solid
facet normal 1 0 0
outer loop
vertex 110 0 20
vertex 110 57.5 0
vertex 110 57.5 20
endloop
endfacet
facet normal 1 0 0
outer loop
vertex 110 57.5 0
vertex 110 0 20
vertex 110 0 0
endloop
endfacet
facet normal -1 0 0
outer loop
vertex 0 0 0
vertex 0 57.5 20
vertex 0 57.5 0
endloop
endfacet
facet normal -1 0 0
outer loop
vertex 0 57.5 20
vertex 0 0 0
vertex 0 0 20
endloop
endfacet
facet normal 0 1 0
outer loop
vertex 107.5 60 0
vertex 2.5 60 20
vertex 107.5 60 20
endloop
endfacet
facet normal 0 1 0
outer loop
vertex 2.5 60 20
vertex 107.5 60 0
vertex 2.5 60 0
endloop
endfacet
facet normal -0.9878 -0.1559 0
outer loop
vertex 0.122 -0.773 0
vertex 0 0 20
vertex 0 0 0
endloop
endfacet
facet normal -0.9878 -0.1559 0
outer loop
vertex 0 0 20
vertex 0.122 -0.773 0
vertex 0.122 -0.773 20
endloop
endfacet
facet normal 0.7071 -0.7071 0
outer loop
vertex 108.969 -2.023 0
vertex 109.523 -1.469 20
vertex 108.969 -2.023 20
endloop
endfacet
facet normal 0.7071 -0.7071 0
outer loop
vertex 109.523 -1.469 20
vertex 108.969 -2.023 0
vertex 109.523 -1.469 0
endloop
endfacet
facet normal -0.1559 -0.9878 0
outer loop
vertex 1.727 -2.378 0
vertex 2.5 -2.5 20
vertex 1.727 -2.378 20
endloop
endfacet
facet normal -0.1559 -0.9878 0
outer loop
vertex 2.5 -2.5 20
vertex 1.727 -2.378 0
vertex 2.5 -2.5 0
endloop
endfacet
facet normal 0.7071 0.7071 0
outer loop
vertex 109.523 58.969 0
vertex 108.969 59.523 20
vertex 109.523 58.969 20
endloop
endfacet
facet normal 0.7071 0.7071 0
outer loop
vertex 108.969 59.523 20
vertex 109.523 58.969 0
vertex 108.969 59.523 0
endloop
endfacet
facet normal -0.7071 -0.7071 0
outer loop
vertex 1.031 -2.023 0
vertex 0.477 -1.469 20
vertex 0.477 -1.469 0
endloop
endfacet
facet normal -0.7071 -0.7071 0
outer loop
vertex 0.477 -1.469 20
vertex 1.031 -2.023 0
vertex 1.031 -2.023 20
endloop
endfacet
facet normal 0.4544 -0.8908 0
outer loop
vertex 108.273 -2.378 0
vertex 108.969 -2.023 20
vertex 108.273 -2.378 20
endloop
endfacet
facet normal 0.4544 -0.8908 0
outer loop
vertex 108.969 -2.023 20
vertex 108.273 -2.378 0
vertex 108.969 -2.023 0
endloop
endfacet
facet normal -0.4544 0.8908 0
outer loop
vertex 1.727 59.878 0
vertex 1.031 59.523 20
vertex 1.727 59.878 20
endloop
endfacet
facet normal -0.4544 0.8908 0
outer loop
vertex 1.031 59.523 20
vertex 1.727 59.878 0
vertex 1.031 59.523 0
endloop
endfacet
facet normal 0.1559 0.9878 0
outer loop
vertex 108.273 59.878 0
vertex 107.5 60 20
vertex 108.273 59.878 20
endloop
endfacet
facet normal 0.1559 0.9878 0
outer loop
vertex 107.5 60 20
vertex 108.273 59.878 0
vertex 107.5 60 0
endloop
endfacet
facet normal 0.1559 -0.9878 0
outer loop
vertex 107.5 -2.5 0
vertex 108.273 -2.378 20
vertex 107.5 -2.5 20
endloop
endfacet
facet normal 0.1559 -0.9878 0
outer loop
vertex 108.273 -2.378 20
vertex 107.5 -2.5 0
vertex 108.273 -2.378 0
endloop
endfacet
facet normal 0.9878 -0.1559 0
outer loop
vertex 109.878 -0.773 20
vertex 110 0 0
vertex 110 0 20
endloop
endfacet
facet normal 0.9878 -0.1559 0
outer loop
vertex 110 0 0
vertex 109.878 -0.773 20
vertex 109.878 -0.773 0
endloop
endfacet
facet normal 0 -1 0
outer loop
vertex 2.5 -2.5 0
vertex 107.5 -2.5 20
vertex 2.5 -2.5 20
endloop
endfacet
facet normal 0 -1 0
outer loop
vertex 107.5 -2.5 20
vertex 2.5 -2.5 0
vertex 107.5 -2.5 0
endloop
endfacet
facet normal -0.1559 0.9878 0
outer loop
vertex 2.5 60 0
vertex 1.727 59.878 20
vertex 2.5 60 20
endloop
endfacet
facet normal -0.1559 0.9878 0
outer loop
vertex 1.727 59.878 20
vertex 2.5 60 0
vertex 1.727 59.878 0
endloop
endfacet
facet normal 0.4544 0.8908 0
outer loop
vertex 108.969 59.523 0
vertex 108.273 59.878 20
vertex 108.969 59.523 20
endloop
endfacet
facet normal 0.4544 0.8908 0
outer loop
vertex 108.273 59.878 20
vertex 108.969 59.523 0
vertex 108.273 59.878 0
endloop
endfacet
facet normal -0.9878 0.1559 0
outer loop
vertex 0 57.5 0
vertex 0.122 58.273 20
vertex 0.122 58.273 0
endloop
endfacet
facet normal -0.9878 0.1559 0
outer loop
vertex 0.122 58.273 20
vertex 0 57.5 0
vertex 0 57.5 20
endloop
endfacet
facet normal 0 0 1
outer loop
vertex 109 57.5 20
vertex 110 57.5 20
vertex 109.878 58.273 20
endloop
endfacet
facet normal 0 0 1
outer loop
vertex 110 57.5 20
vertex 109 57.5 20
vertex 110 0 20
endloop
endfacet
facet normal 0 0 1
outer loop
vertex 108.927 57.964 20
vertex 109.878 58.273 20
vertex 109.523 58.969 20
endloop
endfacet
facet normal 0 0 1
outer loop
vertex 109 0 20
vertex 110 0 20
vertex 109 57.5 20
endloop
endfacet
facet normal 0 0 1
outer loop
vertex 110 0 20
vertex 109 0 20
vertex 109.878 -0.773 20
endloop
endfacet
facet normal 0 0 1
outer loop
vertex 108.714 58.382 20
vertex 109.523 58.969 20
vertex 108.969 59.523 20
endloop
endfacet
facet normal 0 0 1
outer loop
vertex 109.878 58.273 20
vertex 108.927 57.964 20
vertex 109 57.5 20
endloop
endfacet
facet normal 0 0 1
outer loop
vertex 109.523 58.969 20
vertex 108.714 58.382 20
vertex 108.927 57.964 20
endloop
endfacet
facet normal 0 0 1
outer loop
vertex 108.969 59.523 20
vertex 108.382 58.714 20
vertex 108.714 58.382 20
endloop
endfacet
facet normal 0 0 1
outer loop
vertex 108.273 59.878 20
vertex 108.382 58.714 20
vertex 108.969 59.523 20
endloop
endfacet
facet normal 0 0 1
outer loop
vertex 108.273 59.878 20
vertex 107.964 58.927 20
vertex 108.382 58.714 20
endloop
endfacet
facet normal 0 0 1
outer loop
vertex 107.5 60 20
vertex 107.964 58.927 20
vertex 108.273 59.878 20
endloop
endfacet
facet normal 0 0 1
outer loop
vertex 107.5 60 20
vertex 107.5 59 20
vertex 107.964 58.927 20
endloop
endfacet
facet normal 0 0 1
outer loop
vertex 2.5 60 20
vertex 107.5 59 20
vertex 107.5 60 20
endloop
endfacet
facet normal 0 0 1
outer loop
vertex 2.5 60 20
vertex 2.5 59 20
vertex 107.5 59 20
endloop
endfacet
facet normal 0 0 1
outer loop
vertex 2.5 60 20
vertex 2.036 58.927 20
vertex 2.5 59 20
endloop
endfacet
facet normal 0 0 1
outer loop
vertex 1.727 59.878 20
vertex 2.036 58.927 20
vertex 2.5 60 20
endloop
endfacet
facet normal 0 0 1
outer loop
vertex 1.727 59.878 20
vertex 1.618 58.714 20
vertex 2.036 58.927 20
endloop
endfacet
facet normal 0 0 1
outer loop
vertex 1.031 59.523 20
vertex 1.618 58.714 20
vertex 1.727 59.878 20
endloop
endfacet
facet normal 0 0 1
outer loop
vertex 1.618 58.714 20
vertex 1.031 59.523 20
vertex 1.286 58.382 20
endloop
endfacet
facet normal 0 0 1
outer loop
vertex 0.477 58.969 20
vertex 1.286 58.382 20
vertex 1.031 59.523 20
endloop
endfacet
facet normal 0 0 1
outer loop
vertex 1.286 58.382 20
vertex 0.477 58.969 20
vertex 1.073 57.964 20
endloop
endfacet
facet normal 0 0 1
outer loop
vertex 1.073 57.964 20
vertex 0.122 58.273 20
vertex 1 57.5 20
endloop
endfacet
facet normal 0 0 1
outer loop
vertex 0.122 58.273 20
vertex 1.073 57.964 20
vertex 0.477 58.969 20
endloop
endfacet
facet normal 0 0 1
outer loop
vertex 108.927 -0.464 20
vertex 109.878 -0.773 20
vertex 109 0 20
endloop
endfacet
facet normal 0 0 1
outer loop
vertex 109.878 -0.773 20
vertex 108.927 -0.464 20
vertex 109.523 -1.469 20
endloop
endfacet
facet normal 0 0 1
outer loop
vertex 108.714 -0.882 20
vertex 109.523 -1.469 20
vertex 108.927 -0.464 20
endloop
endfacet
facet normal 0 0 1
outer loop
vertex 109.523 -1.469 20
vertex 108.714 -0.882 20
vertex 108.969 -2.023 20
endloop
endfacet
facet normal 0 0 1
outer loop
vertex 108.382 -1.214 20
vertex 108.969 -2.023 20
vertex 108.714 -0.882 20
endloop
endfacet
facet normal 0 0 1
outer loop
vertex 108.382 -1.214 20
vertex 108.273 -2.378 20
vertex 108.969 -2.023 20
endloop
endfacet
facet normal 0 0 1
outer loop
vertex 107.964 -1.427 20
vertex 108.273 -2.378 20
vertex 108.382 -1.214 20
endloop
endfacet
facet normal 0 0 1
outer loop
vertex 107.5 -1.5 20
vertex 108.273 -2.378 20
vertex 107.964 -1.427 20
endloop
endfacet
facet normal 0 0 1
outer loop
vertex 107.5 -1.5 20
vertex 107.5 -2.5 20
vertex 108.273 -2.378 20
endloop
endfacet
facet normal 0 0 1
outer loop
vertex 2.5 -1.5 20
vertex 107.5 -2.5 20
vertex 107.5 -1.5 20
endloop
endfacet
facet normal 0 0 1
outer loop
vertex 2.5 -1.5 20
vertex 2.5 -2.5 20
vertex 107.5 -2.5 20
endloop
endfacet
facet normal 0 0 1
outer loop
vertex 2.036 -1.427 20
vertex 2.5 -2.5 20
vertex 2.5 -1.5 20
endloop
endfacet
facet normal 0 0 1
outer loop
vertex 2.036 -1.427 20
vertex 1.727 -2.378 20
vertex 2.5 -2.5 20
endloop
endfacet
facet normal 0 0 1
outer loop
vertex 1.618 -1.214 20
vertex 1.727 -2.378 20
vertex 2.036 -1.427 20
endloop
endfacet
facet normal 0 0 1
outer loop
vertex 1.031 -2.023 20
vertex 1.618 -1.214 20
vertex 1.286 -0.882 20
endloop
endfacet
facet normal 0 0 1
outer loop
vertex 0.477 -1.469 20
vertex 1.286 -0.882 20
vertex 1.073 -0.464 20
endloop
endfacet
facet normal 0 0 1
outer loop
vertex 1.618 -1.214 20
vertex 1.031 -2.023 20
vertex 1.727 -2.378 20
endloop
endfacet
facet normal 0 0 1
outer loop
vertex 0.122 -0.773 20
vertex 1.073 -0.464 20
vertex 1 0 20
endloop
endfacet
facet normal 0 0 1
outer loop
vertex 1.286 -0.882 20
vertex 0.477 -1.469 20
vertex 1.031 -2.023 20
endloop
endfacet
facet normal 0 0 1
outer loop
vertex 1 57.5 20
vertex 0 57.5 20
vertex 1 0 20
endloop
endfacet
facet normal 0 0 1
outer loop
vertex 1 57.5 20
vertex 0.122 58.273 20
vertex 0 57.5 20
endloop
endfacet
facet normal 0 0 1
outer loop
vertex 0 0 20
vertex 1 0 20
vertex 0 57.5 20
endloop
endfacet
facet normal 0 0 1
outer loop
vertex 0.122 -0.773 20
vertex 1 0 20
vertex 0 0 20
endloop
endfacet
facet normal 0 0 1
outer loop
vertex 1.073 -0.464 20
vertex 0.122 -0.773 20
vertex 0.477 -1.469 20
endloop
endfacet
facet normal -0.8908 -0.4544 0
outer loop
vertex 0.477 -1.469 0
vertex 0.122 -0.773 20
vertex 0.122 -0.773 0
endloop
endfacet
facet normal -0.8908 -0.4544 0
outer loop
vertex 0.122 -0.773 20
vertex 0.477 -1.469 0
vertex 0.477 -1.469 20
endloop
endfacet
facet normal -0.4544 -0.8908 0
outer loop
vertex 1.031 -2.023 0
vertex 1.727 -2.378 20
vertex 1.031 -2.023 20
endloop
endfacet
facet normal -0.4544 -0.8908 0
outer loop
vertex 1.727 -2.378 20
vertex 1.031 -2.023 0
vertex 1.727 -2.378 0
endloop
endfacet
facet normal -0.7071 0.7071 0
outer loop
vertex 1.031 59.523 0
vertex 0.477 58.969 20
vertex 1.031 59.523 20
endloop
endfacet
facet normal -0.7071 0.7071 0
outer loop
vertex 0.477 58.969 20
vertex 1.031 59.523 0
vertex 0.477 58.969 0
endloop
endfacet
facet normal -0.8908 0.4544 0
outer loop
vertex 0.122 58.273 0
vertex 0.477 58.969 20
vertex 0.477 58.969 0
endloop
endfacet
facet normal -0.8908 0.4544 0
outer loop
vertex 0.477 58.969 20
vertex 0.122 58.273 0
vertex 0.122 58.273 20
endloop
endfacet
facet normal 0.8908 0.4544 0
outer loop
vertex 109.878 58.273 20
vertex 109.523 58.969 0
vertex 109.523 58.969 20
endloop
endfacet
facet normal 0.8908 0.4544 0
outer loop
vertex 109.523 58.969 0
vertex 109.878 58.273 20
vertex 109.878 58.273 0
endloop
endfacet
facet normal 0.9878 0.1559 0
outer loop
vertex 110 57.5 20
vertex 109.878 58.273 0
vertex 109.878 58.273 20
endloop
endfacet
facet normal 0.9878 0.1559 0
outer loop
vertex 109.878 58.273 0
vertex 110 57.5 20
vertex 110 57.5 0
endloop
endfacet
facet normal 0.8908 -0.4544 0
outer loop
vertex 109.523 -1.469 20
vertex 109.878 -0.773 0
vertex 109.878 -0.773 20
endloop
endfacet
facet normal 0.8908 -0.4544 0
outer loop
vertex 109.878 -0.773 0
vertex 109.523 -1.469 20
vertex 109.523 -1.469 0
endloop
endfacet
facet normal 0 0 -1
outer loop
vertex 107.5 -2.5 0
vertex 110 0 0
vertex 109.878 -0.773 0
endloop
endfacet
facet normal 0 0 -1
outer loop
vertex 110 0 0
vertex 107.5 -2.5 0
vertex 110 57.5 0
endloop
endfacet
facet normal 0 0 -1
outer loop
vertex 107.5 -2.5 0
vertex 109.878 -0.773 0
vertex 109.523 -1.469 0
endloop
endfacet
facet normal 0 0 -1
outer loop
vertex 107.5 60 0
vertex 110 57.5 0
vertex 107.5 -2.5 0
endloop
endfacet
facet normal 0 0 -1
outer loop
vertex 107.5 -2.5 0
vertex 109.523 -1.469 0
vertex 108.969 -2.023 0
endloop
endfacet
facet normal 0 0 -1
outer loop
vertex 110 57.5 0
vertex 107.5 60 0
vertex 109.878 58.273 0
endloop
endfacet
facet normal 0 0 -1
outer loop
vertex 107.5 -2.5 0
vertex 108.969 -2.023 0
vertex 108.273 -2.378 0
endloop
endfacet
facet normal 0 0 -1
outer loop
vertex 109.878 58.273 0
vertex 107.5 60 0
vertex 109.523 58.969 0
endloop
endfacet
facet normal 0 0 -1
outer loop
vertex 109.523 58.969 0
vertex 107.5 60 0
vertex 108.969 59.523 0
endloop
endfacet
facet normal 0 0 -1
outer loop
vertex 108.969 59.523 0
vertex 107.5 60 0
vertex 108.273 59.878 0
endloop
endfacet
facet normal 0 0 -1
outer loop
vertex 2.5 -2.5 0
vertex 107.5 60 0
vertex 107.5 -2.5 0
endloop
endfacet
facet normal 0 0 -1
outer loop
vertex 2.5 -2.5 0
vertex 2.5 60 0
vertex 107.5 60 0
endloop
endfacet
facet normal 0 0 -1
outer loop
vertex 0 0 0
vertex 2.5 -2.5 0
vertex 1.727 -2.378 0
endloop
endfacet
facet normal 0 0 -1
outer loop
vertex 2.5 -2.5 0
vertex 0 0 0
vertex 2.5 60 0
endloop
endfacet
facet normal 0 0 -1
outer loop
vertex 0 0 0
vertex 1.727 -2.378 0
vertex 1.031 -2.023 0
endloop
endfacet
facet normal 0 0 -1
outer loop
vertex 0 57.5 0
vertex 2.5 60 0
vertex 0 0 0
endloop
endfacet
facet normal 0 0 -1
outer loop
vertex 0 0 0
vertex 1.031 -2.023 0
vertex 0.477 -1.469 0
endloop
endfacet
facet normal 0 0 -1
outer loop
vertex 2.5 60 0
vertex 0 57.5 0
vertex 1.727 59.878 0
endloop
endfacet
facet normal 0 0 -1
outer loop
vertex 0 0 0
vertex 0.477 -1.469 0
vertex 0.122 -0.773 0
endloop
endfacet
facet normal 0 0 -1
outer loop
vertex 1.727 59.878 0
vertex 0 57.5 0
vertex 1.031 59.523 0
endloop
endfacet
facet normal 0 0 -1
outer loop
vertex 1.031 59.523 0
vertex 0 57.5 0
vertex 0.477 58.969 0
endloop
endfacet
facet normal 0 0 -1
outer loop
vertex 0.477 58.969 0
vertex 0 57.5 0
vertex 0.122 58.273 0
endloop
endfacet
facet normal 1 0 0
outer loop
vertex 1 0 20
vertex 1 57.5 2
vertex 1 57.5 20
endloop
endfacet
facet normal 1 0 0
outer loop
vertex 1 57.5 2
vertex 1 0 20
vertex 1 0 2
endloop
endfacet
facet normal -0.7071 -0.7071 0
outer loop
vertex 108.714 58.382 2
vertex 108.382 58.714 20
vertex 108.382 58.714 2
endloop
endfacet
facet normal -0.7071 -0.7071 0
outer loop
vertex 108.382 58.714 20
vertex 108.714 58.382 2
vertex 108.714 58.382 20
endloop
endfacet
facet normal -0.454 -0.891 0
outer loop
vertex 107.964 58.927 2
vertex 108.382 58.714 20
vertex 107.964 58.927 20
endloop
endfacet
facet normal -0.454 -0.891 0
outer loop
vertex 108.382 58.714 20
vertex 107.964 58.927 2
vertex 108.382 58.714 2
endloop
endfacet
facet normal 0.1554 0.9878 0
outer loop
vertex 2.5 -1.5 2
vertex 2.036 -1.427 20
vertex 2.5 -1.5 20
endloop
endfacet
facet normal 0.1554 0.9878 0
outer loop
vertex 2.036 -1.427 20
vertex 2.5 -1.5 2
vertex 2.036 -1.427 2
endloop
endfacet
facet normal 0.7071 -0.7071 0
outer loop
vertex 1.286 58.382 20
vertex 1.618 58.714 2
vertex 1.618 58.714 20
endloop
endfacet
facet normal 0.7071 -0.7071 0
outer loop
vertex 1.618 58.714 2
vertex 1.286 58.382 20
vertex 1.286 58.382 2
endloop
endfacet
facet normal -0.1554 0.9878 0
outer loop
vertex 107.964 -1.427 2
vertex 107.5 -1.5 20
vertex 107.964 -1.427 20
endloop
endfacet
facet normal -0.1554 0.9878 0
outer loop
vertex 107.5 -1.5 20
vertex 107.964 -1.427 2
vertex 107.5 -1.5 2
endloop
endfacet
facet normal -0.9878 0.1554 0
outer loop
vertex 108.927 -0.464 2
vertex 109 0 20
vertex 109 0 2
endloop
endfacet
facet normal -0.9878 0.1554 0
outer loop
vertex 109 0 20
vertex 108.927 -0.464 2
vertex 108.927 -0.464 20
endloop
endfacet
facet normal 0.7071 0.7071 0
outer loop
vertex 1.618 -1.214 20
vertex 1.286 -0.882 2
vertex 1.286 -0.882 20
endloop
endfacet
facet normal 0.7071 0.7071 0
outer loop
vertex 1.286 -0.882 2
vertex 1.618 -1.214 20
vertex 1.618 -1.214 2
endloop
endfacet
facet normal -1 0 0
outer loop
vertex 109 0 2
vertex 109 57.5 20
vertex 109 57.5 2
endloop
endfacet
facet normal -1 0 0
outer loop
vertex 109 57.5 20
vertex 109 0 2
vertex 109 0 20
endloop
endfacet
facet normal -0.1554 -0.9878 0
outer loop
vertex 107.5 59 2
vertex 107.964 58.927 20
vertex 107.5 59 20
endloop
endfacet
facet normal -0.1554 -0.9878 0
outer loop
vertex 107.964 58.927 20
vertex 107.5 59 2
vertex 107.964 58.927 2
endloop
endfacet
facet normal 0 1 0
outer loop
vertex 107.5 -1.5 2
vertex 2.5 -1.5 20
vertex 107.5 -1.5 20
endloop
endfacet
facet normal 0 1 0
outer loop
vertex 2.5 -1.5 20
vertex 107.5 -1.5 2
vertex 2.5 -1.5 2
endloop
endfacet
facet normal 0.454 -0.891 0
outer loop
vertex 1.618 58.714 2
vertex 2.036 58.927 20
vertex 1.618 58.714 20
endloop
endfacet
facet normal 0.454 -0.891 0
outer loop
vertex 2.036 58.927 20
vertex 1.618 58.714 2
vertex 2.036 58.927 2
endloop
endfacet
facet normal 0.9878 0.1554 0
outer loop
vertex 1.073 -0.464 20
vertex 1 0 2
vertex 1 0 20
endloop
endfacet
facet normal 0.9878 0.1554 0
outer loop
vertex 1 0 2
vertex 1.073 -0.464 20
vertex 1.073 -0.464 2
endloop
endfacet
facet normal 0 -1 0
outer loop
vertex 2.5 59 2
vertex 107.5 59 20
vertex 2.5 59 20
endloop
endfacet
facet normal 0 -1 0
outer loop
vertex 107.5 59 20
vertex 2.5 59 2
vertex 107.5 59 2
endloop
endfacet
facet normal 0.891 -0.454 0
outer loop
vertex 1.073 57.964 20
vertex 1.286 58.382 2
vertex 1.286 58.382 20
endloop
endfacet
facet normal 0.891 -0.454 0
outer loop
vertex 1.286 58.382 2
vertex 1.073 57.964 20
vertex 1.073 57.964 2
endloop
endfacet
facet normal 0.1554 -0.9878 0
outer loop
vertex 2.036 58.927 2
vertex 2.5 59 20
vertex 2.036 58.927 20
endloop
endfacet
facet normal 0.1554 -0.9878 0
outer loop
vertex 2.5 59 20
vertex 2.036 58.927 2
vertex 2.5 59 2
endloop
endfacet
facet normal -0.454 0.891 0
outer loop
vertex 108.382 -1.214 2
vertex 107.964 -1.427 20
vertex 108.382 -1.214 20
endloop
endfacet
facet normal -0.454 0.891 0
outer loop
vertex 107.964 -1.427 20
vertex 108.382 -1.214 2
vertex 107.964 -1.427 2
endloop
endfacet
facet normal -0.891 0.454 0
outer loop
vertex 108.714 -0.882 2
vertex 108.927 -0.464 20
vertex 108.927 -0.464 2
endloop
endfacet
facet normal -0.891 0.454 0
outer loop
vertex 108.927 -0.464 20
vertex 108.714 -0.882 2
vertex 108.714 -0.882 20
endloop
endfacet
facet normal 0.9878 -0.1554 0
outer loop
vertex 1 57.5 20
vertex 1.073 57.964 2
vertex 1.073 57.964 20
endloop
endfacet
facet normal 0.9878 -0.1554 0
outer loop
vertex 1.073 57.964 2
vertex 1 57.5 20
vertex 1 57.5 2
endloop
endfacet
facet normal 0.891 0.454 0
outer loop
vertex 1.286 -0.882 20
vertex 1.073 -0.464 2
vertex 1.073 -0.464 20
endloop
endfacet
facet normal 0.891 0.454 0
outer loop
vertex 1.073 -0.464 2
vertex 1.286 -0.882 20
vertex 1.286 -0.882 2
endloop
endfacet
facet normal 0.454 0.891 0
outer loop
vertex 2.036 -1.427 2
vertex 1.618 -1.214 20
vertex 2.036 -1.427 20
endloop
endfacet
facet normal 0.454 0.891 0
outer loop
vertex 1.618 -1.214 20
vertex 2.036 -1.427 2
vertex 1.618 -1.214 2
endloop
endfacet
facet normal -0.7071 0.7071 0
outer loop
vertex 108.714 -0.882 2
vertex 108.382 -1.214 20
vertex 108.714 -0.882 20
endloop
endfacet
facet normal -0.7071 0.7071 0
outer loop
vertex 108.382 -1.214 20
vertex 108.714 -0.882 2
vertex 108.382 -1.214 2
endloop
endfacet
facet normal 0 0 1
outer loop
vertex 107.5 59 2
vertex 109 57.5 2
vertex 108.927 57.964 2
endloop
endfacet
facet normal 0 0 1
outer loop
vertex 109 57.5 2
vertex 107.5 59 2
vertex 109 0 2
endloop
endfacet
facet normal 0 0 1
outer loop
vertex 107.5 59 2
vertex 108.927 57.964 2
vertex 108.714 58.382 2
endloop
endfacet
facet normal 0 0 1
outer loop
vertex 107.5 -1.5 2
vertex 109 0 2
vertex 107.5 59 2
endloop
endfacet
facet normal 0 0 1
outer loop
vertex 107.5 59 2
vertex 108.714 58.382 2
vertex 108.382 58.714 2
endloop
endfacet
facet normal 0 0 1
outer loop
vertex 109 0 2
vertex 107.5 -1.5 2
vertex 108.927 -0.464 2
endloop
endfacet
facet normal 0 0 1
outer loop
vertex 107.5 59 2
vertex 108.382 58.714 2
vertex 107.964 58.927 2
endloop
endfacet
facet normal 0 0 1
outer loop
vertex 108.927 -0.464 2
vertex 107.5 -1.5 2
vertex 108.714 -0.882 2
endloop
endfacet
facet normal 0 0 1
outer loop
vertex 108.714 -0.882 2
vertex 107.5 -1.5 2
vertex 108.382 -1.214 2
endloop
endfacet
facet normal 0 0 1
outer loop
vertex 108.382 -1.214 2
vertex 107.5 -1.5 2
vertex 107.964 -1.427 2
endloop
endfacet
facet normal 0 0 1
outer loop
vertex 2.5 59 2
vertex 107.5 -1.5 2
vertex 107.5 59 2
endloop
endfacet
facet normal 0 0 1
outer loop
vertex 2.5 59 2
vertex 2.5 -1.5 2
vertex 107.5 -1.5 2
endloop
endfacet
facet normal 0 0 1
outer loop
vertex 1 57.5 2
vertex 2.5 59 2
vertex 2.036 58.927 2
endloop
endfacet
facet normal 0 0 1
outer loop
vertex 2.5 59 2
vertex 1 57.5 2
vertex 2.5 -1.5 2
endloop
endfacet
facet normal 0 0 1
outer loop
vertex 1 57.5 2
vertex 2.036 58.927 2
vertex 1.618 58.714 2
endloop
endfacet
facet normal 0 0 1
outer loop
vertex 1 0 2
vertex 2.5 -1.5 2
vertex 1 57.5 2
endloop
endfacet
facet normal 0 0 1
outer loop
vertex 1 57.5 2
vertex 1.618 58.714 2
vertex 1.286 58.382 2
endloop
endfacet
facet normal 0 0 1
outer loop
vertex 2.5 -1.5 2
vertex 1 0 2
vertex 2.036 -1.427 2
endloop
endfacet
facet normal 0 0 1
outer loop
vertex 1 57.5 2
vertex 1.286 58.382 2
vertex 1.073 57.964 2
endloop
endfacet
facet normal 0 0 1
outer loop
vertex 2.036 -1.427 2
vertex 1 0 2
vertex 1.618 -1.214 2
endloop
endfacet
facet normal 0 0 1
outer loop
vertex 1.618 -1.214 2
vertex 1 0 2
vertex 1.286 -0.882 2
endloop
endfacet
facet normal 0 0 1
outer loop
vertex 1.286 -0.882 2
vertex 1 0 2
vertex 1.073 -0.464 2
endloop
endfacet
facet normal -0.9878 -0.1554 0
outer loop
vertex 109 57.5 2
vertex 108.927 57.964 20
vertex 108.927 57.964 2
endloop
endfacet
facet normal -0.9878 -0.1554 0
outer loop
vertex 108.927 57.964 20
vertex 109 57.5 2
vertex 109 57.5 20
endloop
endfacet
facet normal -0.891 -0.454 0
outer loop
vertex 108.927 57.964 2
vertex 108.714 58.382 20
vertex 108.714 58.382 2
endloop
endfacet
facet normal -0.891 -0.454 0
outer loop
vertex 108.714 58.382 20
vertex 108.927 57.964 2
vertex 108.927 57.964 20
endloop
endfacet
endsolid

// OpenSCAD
/**
 * tft24.scad
 * 
 * Created by Diego Viejo
 * 24/Oct/2019
 * 
 * Case for attaching a BigTreeTech TFT24 V1.1 display to a 60x20 profile
 * 
 */

Height = 60;
Width = 110;
Length = 20;

roundCorner = 5;

module case()
{
    difference()
    {
        hull()
        {
            translate([roundCorner/2, 0, 0]) cylinder(d=roundCorner, h=Length, $fn=20);
            translate([Width - roundCorner/2, 0, 0]) cylinder(d=roundCorner, h=Length, $fn=20);
            translate([roundCorner/2, Height - roundCorner/2, 0]) cylinder(d=roundCorner, h=Length, $fn=20);
            translate([Width - roundCorner/2, Height - roundCorner/2, 0]) cylinder(d=roundCorner, h=Length, $fn=20);
        }
        
        hull()
        {
            translate([roundCorner/2, 0, 2]) cylinder(d=roundCorner-2, h=Length, $fn=20);
            translate([Width - roundCorner/2, 0, 2]) cylinder(d=roundCorner-2, h=Length, $fn=20);
            translate([roundCorner/2, Height - roundCorner/2, 2]) cylinder(d=roundCorner-2, h=Length, $fn=20);
            translate([Width - roundCorner/2, Height - roundCorner/2, 2]) cylinder(d=roundCorner-2,     h=Length, $fn=20);
        }
    }
}

case();
